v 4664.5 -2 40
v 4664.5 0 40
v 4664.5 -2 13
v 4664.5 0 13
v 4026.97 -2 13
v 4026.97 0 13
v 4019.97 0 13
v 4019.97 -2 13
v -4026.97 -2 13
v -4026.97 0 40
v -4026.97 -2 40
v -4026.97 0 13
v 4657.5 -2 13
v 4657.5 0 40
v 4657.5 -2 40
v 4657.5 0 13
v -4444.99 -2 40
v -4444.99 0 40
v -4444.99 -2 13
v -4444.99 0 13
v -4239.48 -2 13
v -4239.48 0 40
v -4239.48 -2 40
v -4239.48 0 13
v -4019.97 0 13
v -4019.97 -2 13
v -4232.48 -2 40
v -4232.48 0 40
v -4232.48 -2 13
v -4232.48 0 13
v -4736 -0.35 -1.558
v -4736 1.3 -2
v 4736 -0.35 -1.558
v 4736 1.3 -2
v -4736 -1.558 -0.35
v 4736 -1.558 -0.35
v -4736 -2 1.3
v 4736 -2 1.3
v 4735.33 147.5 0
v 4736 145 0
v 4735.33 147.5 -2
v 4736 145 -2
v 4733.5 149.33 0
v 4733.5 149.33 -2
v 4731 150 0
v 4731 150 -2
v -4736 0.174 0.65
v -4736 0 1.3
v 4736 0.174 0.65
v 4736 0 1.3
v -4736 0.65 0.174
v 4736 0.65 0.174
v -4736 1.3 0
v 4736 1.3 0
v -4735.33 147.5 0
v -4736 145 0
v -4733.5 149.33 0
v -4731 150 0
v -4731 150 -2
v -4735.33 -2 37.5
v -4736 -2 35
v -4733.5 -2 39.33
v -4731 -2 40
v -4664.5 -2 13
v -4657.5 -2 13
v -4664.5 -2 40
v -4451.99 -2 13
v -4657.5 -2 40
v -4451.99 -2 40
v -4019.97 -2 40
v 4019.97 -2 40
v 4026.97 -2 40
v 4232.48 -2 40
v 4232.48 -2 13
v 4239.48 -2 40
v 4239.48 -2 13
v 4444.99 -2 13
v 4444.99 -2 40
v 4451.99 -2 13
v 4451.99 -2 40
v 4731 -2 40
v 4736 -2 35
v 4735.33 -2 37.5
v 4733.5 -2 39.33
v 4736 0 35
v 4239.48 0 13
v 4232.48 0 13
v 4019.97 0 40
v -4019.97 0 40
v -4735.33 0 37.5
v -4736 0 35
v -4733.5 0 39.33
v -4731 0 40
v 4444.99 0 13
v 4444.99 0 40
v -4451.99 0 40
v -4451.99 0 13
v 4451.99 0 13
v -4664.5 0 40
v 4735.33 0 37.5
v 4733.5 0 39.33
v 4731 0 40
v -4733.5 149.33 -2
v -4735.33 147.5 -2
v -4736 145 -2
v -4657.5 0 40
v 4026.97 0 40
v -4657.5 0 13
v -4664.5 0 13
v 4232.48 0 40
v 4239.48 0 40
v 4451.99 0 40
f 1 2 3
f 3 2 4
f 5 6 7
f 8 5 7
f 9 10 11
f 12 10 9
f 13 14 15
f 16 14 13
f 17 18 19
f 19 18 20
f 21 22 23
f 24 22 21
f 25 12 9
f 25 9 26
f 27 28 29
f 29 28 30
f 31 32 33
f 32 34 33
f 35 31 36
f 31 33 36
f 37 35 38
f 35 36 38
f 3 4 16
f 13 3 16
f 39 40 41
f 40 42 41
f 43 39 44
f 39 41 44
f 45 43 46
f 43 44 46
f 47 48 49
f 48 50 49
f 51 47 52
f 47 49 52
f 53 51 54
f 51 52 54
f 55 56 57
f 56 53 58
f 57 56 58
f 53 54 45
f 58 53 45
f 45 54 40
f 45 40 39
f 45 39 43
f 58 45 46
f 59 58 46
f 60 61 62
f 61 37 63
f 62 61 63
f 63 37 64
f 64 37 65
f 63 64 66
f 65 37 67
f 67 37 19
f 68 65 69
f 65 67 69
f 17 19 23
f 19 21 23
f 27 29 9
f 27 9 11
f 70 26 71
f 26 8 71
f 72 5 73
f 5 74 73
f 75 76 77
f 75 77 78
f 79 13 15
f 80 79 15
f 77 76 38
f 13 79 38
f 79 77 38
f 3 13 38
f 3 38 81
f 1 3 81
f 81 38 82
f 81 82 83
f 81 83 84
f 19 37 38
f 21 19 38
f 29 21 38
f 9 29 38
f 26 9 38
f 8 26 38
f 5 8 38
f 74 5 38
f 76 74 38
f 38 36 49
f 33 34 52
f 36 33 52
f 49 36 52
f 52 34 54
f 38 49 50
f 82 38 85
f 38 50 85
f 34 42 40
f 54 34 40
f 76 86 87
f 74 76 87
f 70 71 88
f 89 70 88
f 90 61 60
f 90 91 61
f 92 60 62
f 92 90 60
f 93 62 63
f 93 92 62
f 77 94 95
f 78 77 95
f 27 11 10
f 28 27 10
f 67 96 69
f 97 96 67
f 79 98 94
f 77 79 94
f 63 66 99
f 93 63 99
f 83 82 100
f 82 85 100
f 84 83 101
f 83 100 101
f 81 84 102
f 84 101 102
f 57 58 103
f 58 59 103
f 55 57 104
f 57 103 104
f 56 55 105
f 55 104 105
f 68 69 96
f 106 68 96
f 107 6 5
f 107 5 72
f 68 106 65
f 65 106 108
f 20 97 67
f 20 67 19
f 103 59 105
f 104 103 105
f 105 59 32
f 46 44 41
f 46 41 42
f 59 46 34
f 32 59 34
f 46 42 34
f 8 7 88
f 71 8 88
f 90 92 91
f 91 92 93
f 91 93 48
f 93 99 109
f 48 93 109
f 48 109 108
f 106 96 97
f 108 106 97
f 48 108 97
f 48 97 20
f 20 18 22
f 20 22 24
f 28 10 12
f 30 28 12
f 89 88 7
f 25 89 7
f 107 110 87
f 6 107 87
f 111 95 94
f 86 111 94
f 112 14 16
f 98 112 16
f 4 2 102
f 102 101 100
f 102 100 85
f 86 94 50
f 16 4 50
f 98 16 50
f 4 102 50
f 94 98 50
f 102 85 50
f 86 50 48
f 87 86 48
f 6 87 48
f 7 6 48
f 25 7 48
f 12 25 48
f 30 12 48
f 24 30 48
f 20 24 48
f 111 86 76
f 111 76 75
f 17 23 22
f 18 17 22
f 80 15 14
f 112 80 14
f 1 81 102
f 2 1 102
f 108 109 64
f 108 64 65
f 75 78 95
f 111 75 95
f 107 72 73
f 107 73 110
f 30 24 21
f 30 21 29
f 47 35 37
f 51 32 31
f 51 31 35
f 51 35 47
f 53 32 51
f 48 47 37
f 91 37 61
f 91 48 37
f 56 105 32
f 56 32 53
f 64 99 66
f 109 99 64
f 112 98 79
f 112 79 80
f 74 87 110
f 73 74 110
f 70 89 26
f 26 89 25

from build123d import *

# Parameters (mm, degrees)
BASE_FLANGE1_DEPTH       = 4736
FILLET1_R                = 5
SKETCH2_W                = 7
SKETCH2_H                = 35
CUT_EXTRUDE1_DEPTH       = 10
PATTERN_LINEAR_1_COUNT   = 4
PATTERN_LINEAR_1_PITCH   = 212.51
MIRROR_1_COPY_1_SKETCH_W = 7
MIRROR_1_COPY_1_SKETCH_H = 35
MIRROR_1_COPY_1_DEPTH    = 10
MIRROR_1_COPY_2_SKETCH_W = 7
MIRROR_1_COPY_2_SKETCH_H = 35
MIRROR_1_COPY_2_DEPTH    = 10
MIRROR_1_COPY_3_SKETCH_W = 7
MIRROR_1_COPY_3_SKETCH_H = 35
MIRROR_1_COPY_3_DEPTH    = 10


# Sheet-metal steps are written as plain solids
with BuildPart() as part:
    # Sketch1 → Base-Flange1 (new, symmetric)
    with BuildSketch(Plane(origin=(0, 0, 0), x_dir=(0, 0, -1), z_dir=(1, 0, 0))):
        with BuildLine():
            Line((-40, 0), (-1.3, 0))
            ThreePointArc((-1.3, 0), (-0.380761184, 0.380761184), (0, 1.3))
            Line((0, 1.3), (0, 150))
            Line((0, 150), (2, 150))
            Line((2, 150), (2, 1.3))
            ThreePointArc((2, 1.3), (1.033452378, -1.033452378), (-1.3, -2))
            Line((-1.3, -2), (-40, -2))
            Line((-40, -2), (-40, 0))
        make_face()
    extrude(amount=BASE_FLANGE1_DEPTH, both=True)

    # Fillet1
    fillet1_edges = [part.edges().sort_by_distance(p)[0] for p in [
        (4736, -1, 40),
        (-4736, -1, 40),
        (4736, 150, -1),
        (-4736, 150, -1),
    ]]
    fillet(fillet1_edges, radius=FILLET1_R)

    # Sketch2 → Cut-Extrude1 (cut)
    with BuildSketch(Plane(origin=(0, 0, 0), x_dir=(1, 0, 0), z_dir=(0, 1, 0))):
        with Locations((-4661, -30.5)):
            Rectangle(SKETCH2_W, SKETCH2_H)
    cut_extrude1 = extrude(amount=-CUT_EXTRUDE1_DEPTH, mode=Mode.SUBTRACT)

    # 阵列(线性)1: Cut-Extrude1 ×4
    with Locations(*[(i * PATTERN_LINEAR_1_PITCH, 0, 0) for i in range(1, PATTERN_LINEAR_1_COUNT)]):
        add(cut_extrude1, mode=Mode.SUBTRACT)

    # 镜向1: Cut-Extrude1 across plane
    add(cut_extrude1.mirror(Plane.ZY), mode=Mode.SUBTRACT)

    # 镜向1 copy 1 sketch → 镜向1 copy 1 (cut)
    with BuildSketch(Plane(origin=(-212.51, 0, 0), x_dir=(-1, 0, 0), z_dir=(0, 1, 0))):
        with Locations((-4661, 30.5)):
            Rectangle(MIRROR_1_COPY_1_SKETCH_W, MIRROR_1_COPY_1_SKETCH_H)
    extrude(amount=-MIRROR_1_COPY_1_DEPTH, mode=Mode.SUBTRACT)

    # 镜向1 copy 2 sketch → 镜向1 copy 2 (cut)
    with BuildSketch(Plane(origin=(-425.02, 0, 0), x_dir=(-1, 0, 0), z_dir=(0, 1, 0))):
        with Locations((-4661, 30.5)):
            Rectangle(MIRROR_1_COPY_2_SKETCH_W, MIRROR_1_COPY_2_SKETCH_H)
    extrude(amount=-MIRROR_1_COPY_2_DEPTH, mode=Mode.SUBTRACT)

    # 镜向1 copy 3 sketch → 镜向1 copy 3 (cut)
    with BuildSketch(Plane(origin=(-637.53, 0, 0), x_dir=(-1, 0, 0), z_dir=(0, 1, 0))):
        with Locations((-4661, 30.5)):
            Rectangle(MIRROR_1_COPY_3_SKETCH_W, MIRROR_1_COPY_3_SKETCH_H)
    extrude(amount=-MIRROR_1_COPY_3_DEPTH, mode=Mode.SUBTRACT)


solid = part.part
